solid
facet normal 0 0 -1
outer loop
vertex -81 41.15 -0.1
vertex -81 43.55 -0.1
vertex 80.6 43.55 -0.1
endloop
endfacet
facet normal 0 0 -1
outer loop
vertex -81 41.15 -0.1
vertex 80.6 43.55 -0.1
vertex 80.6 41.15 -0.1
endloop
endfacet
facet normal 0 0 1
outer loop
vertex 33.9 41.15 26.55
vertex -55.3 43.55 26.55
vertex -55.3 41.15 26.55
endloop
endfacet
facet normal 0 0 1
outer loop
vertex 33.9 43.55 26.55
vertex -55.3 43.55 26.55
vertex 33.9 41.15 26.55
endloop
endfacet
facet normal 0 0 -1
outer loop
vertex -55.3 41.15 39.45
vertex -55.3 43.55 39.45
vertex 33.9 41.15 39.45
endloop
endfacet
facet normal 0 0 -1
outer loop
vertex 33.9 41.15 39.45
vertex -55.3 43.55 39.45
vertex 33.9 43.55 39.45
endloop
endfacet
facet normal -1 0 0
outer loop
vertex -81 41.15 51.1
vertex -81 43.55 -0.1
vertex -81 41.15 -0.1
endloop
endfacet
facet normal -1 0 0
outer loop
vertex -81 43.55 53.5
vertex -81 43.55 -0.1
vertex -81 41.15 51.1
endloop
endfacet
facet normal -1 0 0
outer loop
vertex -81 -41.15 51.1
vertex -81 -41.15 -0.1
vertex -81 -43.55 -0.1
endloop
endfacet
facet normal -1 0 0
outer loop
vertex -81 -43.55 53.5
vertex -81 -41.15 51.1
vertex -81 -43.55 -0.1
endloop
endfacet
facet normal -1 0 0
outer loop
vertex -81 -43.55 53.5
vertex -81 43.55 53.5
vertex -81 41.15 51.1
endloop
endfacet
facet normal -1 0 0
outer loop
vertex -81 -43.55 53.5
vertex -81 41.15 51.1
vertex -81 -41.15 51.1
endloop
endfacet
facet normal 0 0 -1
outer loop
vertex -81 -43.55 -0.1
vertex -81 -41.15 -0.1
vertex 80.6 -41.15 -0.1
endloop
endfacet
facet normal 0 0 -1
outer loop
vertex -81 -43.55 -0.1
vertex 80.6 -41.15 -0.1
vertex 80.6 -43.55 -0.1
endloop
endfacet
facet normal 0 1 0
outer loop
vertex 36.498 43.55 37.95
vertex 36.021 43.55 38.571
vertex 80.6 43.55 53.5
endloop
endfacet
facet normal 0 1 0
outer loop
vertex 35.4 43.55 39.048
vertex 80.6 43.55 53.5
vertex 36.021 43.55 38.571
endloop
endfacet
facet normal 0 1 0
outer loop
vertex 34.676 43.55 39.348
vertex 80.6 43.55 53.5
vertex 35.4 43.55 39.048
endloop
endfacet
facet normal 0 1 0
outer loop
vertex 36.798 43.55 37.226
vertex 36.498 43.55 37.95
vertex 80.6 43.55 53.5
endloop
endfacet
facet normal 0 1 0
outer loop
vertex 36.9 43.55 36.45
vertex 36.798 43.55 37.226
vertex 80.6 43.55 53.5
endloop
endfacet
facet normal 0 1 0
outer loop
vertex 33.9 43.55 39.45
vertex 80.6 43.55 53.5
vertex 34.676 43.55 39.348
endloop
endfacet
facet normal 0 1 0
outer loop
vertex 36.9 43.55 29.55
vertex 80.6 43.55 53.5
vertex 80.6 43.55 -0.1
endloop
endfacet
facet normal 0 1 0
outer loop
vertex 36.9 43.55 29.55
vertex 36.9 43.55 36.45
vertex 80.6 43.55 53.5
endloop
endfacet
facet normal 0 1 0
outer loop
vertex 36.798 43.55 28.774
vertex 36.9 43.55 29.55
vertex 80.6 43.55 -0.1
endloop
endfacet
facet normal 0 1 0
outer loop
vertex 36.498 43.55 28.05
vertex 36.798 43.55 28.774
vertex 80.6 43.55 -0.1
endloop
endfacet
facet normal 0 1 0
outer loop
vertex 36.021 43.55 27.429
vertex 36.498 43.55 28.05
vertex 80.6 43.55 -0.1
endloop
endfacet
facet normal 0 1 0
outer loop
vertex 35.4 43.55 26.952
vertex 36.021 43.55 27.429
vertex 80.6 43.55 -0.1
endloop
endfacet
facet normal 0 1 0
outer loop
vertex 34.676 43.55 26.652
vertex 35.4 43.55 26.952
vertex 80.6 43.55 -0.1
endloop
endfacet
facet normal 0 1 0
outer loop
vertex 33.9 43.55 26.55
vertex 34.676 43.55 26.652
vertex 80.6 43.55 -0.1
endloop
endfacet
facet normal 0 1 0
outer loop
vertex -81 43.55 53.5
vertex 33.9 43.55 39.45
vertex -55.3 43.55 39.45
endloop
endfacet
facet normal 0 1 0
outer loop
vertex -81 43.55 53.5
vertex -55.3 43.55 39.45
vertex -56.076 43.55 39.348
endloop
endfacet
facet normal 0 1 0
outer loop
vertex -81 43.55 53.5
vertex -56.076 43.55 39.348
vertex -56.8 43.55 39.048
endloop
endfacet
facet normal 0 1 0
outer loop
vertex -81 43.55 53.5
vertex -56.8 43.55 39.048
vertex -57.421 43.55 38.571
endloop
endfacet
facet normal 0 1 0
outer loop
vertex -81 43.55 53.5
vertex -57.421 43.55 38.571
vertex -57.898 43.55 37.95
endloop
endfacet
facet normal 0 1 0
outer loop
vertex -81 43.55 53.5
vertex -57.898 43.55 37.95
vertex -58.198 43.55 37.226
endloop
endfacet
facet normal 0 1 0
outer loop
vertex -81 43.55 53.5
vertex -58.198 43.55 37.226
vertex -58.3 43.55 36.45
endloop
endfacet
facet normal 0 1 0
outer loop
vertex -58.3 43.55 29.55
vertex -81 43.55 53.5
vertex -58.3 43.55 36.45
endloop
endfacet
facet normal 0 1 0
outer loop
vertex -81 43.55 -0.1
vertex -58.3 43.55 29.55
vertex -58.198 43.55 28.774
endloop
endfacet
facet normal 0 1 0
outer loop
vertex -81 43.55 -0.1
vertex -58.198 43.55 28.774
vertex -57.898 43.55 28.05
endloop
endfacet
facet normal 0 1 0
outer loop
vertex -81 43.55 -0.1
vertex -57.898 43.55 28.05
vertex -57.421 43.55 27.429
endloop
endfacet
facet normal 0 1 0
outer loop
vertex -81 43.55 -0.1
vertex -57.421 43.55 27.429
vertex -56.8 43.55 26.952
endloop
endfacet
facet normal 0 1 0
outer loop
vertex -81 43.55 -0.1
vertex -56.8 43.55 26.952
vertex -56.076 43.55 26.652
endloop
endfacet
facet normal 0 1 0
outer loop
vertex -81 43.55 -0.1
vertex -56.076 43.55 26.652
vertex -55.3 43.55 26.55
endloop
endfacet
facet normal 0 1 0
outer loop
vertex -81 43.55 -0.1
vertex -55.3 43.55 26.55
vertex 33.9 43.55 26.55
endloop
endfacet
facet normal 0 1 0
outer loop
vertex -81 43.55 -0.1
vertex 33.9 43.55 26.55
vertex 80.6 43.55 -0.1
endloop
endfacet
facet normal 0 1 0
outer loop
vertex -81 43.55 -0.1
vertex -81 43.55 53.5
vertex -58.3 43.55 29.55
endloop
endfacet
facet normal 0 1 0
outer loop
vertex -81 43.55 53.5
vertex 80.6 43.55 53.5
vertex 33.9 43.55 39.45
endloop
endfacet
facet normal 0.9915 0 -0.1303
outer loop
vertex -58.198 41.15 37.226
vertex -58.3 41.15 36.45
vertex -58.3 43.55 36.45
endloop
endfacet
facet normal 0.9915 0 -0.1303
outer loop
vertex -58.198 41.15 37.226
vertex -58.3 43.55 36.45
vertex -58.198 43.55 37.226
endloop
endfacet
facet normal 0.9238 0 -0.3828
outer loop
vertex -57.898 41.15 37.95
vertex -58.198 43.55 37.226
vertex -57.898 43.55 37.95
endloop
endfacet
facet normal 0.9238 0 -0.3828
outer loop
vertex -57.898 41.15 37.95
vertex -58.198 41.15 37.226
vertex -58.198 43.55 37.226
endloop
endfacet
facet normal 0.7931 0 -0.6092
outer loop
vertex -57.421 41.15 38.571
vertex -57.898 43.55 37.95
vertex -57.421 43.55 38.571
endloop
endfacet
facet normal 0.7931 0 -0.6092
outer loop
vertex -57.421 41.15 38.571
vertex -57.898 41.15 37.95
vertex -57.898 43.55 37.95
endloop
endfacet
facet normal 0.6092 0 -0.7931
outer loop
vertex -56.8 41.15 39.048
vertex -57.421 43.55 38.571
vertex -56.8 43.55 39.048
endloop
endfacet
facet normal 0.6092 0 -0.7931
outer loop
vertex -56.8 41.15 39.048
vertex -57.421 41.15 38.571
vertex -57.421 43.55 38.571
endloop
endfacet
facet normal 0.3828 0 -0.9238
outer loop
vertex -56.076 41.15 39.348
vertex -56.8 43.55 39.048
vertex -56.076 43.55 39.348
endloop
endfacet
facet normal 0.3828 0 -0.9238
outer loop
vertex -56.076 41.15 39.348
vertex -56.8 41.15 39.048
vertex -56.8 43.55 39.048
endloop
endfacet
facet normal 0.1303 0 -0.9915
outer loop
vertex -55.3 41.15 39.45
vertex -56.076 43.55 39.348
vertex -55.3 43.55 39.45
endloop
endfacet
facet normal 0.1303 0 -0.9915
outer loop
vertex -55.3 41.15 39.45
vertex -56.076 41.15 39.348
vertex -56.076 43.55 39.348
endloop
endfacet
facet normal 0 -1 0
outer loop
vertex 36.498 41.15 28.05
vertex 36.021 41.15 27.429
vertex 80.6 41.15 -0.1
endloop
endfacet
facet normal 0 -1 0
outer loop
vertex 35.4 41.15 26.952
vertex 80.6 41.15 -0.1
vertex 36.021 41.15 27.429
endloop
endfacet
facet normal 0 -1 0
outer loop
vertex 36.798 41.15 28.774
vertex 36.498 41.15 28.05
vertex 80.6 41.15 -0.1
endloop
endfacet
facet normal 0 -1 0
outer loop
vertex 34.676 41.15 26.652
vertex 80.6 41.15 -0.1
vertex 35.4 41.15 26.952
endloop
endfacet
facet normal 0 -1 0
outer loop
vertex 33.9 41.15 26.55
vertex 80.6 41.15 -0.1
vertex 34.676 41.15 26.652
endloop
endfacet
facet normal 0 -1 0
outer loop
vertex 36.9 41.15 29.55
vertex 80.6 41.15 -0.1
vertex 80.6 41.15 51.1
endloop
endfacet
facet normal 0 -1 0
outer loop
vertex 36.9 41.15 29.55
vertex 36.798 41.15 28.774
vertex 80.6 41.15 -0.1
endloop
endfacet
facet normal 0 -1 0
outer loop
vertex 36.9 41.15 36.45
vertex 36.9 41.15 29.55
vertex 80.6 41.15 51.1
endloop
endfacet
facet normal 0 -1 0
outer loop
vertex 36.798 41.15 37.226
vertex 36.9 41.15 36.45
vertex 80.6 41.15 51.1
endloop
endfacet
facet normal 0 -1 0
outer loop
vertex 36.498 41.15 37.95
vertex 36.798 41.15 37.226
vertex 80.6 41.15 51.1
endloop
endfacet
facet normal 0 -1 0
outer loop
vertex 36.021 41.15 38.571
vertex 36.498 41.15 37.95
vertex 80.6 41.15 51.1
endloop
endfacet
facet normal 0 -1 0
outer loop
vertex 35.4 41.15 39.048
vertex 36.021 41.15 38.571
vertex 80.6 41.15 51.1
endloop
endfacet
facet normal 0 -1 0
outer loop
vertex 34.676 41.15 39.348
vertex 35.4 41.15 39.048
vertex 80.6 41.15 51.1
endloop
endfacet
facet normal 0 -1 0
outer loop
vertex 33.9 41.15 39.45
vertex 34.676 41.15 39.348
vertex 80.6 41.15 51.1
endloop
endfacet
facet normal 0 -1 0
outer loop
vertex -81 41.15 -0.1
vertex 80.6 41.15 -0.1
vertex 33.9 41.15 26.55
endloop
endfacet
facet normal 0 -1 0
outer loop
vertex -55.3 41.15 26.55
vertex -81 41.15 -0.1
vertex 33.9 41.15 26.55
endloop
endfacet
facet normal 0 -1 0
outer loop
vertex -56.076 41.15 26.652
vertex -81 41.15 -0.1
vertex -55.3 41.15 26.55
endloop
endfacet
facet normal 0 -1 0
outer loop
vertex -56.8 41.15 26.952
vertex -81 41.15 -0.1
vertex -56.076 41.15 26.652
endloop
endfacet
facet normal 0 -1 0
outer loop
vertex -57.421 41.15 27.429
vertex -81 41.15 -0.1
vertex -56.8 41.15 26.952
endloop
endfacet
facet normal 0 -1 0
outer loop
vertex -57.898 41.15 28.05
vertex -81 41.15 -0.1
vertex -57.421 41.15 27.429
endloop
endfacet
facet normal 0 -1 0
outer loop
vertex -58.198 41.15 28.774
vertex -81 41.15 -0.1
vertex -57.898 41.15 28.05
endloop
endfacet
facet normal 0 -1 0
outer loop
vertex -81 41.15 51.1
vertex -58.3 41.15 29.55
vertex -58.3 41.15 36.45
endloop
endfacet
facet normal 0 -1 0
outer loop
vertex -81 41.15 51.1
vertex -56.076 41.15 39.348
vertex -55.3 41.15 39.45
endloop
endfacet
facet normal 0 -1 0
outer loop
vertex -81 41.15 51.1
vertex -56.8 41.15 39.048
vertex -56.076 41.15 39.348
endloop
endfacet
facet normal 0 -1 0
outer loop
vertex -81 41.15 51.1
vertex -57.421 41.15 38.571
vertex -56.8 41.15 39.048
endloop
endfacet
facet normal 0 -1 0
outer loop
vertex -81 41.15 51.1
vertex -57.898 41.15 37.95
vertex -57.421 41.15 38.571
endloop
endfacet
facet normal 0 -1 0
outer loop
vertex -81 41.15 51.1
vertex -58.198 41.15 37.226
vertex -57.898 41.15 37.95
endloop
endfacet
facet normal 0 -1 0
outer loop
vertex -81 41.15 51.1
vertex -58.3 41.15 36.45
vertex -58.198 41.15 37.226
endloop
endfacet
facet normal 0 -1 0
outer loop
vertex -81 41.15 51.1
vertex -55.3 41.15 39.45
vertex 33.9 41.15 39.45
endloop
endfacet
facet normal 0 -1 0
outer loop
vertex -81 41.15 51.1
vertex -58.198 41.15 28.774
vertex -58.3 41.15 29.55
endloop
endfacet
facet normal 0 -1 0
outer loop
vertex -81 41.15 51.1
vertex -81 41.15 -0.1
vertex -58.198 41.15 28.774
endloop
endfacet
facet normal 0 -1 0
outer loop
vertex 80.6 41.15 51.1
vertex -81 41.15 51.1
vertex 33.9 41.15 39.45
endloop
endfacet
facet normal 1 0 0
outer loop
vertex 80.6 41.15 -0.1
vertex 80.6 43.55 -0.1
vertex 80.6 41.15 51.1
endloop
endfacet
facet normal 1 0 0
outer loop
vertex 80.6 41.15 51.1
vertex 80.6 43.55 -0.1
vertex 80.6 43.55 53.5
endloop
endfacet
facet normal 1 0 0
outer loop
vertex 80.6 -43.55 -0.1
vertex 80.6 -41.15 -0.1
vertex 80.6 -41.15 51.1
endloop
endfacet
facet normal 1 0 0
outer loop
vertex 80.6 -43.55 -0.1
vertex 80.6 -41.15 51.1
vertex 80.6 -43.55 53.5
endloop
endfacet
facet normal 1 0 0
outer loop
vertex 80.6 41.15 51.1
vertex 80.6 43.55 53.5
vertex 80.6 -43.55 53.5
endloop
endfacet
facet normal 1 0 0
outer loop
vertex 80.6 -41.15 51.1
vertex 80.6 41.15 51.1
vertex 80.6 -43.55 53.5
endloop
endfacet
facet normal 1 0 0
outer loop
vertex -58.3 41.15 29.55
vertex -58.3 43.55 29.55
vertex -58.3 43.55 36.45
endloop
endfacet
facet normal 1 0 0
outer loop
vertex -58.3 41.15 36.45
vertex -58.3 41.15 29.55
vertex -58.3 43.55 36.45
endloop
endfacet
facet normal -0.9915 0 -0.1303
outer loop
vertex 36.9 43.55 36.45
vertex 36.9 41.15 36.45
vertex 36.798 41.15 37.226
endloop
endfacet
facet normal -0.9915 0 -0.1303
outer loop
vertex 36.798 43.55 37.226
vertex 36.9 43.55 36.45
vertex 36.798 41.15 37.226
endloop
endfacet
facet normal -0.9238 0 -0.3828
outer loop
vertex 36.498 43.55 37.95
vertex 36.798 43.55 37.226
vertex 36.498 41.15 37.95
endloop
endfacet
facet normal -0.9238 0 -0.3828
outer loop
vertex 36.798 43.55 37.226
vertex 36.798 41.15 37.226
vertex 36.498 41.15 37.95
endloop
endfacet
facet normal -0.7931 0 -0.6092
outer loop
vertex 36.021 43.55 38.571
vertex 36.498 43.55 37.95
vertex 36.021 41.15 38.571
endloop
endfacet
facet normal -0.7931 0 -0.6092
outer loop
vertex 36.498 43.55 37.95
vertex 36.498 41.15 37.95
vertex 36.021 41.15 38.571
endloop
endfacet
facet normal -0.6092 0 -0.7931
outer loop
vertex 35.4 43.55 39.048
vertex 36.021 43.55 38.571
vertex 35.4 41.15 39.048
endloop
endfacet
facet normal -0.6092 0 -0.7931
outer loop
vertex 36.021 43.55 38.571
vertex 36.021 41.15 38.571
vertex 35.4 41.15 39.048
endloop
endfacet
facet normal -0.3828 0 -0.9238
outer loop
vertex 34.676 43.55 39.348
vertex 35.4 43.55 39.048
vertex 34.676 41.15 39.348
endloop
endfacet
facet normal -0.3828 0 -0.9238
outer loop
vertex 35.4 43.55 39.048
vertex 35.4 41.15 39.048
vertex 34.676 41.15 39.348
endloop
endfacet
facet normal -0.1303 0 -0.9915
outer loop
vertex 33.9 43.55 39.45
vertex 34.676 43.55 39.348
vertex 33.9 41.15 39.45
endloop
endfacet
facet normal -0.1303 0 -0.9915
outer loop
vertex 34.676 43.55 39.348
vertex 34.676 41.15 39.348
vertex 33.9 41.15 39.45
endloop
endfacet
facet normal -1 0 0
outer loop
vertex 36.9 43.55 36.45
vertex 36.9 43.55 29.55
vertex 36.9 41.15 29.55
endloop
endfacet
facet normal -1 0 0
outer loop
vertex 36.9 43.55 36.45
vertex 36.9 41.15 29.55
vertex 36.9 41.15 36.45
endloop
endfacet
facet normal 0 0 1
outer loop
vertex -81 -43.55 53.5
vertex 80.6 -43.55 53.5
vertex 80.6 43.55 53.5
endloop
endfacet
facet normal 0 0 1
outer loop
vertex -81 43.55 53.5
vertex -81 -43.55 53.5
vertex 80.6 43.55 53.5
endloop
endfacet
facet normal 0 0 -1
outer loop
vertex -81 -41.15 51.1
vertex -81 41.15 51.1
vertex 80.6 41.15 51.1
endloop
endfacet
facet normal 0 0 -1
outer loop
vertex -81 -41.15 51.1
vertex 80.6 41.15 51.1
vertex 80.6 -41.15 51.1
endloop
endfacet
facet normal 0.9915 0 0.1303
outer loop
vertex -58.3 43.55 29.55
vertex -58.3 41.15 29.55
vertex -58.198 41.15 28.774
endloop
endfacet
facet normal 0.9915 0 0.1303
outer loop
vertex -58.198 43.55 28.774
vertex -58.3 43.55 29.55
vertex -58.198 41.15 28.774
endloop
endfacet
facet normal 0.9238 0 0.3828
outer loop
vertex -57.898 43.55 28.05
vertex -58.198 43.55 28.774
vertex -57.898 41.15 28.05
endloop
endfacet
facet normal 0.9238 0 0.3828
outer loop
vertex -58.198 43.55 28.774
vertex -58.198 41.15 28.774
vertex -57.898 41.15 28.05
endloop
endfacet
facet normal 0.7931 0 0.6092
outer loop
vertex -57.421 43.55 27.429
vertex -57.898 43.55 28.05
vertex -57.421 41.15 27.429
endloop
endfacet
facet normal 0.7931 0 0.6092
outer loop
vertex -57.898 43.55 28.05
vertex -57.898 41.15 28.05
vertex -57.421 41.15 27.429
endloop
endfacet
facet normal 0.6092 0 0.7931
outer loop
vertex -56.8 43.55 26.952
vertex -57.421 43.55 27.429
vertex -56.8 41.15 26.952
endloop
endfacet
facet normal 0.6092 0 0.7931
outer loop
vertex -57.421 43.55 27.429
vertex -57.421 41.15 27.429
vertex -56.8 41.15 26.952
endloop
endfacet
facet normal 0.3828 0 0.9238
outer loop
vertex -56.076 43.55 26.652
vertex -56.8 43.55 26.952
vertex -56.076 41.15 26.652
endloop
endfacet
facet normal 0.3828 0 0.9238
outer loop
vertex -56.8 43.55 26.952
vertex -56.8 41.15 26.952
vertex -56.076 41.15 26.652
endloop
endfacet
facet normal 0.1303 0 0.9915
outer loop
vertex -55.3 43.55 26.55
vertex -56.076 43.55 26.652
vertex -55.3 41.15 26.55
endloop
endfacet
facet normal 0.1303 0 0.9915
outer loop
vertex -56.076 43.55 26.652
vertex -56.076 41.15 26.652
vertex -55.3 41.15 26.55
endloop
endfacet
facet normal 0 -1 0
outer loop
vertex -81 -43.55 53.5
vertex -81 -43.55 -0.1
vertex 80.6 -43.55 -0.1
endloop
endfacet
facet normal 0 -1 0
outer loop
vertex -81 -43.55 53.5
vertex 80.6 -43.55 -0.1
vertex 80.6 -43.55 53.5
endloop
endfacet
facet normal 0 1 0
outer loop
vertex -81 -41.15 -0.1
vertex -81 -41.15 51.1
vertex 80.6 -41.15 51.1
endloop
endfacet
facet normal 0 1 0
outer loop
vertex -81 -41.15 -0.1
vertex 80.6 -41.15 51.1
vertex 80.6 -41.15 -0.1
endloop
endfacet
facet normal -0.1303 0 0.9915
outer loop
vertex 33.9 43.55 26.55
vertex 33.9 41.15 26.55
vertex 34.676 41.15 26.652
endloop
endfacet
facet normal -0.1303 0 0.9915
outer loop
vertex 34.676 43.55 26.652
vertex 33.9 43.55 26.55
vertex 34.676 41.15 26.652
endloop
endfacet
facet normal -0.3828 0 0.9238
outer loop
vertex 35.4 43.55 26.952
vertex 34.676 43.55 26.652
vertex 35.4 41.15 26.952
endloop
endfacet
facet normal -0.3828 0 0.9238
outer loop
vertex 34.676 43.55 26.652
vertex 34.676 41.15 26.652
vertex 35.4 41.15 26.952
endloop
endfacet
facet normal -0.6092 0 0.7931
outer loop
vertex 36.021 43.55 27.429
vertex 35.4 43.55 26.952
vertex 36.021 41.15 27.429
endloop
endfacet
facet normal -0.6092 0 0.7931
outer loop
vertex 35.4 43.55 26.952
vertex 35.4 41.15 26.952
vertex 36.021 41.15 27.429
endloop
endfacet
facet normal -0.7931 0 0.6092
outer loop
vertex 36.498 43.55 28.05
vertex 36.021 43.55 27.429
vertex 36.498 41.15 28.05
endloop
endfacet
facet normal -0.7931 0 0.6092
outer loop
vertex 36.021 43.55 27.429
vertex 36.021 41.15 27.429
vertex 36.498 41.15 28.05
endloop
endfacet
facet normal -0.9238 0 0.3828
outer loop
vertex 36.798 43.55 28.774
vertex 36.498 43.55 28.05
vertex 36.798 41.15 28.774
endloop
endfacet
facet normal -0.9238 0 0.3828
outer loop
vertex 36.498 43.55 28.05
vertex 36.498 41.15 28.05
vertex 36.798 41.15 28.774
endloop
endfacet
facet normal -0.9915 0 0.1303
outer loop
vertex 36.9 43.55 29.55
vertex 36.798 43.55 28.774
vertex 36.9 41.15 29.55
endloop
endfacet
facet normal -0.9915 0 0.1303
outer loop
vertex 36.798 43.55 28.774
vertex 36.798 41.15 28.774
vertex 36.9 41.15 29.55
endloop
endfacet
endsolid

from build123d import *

# Parameters (mm, degrees)
SKETCH011_W  = 95.2
SKETCH011_H  = 12.9
PAD009_DEPTH = 30
FILLET002_R  = 3
PAD008_DEPTH = 161.6


with BuildPart() as tubecutout001:
    # Sketch011 → Pad009 (new body)
    with BuildSketch(Plane(origin=(-10.7, 54, 33), x_dir=(1, 0, 0), z_dir=(0, -1, 0))):
        Rectangle(SKETCH011_W, SKETCH011_H)
    extrude(amount=PAD009_DEPTH)

    # Fillet002
    fillet002_edges = [tubecutout001.edges().sort_by_distance(p)[0] for p in [
        (-58.3, 39, 39.45),
        (-58.3, 39, 26.55),
        (36.9, 39, 39.45),
        (36.9, 39, 26.55),
    ]]
    fillet(fillet002_edges, radius=FILLET002_R)


with BuildPart() as boxcover:
    # Sketch010 → Pad008 (new body)
    with BuildSketch(Plane(origin=(-81, 0, 25.5), x_dir=(0, 1, 0), z_dir=(1, 0, 0))):
        Polygon((-43.55, -25.6), (-43.55, 28), (43.55, 28), (43.55, -25.6), (41.15, -25.6), (41.15, 25.6), (-41.15, 25.6), (-41.15, -25.6), align=None)
    extrude(amount=PAD008_DEPTH)

    # Cut001: cut TubeCutout001
    add(tubecutout001.part, mode=Mode.SUBTRACT)


solid = boxcover.part
